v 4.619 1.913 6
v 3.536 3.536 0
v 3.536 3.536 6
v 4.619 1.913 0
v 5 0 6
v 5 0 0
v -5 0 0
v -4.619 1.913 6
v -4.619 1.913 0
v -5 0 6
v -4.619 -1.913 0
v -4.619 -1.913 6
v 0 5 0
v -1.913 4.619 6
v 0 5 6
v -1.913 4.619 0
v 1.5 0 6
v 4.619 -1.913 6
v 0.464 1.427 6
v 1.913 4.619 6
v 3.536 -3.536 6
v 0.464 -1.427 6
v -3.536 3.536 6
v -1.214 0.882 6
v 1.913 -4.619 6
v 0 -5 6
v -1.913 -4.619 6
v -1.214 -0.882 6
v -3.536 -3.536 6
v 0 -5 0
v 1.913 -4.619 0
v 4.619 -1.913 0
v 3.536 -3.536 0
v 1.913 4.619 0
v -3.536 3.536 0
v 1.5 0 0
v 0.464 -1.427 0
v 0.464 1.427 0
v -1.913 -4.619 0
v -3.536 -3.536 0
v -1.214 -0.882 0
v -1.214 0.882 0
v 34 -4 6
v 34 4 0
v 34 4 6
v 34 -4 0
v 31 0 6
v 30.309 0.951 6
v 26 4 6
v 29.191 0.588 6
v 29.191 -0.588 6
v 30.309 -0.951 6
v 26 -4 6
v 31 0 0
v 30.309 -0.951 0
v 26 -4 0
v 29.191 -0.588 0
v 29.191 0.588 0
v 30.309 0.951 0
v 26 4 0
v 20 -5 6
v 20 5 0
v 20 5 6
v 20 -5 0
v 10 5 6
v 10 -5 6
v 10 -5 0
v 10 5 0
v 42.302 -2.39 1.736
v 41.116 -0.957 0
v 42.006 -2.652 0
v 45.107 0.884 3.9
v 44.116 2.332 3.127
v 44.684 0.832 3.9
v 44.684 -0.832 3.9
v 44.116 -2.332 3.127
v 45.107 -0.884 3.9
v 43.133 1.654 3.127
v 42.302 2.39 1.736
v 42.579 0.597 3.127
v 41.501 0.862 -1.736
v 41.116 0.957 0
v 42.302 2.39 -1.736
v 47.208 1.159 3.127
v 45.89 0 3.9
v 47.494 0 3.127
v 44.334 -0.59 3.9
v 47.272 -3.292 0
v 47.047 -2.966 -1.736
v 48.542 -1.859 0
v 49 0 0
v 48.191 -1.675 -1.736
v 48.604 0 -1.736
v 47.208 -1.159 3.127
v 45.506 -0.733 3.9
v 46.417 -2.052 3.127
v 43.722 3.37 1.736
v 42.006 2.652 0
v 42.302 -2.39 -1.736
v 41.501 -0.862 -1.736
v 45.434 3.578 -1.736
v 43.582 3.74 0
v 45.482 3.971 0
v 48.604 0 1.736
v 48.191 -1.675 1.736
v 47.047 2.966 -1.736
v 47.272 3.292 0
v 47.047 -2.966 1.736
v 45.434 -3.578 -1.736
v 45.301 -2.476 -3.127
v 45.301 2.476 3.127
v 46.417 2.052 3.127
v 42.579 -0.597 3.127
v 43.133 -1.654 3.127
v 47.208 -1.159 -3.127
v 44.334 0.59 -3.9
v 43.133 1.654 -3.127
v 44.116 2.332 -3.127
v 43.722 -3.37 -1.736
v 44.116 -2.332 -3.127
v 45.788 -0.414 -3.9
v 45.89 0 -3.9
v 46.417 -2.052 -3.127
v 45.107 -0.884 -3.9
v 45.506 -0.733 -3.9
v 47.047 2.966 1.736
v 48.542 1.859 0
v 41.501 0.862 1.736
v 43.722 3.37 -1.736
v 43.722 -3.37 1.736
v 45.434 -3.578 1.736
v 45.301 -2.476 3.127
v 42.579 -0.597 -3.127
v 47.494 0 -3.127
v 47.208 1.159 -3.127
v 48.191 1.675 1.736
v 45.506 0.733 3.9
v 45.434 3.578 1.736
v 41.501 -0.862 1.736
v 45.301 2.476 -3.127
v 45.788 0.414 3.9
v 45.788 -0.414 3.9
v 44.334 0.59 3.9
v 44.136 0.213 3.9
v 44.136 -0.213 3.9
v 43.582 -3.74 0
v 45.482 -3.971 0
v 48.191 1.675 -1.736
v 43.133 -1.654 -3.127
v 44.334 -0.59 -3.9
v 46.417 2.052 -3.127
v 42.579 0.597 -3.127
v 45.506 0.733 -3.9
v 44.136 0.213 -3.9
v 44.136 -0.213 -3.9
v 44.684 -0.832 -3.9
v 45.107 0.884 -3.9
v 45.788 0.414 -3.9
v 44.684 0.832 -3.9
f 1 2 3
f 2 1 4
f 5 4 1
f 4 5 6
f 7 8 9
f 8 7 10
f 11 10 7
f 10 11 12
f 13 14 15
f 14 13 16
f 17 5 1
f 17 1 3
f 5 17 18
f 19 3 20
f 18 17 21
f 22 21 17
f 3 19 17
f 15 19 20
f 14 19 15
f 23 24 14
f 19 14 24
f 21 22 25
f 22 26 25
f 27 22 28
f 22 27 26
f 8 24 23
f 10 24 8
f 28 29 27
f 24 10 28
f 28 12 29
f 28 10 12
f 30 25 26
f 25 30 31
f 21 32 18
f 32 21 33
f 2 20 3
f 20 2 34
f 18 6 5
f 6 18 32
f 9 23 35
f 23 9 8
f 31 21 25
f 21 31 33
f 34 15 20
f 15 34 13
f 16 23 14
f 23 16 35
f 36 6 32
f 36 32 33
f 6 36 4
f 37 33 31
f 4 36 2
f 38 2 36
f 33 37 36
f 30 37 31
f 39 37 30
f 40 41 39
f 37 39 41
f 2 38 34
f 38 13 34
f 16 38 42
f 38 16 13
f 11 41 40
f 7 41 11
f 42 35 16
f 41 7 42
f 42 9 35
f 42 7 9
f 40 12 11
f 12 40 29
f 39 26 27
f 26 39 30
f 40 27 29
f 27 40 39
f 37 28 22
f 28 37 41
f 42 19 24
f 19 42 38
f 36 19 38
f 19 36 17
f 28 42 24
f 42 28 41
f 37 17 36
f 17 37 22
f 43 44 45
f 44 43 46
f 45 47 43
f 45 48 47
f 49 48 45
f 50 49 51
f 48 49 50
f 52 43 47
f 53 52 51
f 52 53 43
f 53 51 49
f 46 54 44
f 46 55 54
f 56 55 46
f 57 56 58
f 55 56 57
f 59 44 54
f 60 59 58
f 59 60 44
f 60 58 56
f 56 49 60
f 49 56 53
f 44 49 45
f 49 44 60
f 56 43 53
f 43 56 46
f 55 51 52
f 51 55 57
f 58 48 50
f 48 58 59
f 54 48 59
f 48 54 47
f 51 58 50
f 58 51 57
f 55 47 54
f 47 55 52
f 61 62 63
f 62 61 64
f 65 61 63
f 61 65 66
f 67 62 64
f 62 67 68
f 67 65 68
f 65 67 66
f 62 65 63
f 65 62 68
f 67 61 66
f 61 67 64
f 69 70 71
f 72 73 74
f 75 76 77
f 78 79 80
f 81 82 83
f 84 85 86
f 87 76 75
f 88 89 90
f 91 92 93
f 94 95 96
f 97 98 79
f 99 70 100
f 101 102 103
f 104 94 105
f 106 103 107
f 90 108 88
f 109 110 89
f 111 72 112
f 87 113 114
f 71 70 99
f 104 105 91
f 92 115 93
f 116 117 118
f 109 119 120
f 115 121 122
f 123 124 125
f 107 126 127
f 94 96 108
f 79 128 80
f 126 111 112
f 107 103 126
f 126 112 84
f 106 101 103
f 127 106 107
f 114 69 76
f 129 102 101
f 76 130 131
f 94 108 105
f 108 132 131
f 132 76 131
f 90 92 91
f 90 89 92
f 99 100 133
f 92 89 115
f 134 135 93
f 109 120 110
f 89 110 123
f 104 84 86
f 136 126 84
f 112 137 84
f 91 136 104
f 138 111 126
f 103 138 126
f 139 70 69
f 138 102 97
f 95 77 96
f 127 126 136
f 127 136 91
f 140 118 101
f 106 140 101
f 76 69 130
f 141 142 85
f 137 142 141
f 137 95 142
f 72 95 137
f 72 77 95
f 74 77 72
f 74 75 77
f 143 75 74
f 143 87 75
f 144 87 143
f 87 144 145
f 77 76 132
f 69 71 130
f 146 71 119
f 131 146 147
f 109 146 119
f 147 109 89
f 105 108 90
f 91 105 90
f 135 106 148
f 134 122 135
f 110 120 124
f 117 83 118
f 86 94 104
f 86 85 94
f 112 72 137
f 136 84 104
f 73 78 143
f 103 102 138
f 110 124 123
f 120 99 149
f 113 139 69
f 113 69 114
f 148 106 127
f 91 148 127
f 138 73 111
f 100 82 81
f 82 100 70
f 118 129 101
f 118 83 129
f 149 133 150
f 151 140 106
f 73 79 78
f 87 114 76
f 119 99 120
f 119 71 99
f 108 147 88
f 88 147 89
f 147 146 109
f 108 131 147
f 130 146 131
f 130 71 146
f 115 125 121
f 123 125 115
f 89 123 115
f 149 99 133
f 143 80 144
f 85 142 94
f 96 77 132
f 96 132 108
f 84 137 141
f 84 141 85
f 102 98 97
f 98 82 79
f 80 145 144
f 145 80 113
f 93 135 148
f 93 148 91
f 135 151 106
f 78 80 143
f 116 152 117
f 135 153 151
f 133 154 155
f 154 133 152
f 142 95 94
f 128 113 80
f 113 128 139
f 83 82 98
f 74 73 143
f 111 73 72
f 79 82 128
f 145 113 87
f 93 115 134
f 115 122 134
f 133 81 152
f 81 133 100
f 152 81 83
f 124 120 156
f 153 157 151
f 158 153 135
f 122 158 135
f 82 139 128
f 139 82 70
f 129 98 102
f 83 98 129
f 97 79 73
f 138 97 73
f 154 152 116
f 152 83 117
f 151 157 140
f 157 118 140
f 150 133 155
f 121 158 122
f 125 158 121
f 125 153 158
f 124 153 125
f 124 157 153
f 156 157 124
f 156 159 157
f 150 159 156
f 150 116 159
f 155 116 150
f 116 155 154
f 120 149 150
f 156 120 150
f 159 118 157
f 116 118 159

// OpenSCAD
// Zweck: if/else and ?: select variants of a knob (round, square, with/without bore).
module knob(style = "round", hole = true, size = 10) {
    difference() {
        if (style == "round") cylinder(h = 6, d = size);
        else if (style == "square") translate([-size / 2, -size / 2, 0]) cube([size, size, 6]);
        else sphere(size / 2);
        if (hole) translate([0, 0, -1]) cylinder(h = 8, d = size > 8 ? 3 : 2);
    }
}
knob();
translate([15, 0, 0]) knob("square", false);
translate([30, 0, 0]) knob(style = "square", size = 8);
translate([45, 0, 0]) knob("ball", hole = false, size = 8);
